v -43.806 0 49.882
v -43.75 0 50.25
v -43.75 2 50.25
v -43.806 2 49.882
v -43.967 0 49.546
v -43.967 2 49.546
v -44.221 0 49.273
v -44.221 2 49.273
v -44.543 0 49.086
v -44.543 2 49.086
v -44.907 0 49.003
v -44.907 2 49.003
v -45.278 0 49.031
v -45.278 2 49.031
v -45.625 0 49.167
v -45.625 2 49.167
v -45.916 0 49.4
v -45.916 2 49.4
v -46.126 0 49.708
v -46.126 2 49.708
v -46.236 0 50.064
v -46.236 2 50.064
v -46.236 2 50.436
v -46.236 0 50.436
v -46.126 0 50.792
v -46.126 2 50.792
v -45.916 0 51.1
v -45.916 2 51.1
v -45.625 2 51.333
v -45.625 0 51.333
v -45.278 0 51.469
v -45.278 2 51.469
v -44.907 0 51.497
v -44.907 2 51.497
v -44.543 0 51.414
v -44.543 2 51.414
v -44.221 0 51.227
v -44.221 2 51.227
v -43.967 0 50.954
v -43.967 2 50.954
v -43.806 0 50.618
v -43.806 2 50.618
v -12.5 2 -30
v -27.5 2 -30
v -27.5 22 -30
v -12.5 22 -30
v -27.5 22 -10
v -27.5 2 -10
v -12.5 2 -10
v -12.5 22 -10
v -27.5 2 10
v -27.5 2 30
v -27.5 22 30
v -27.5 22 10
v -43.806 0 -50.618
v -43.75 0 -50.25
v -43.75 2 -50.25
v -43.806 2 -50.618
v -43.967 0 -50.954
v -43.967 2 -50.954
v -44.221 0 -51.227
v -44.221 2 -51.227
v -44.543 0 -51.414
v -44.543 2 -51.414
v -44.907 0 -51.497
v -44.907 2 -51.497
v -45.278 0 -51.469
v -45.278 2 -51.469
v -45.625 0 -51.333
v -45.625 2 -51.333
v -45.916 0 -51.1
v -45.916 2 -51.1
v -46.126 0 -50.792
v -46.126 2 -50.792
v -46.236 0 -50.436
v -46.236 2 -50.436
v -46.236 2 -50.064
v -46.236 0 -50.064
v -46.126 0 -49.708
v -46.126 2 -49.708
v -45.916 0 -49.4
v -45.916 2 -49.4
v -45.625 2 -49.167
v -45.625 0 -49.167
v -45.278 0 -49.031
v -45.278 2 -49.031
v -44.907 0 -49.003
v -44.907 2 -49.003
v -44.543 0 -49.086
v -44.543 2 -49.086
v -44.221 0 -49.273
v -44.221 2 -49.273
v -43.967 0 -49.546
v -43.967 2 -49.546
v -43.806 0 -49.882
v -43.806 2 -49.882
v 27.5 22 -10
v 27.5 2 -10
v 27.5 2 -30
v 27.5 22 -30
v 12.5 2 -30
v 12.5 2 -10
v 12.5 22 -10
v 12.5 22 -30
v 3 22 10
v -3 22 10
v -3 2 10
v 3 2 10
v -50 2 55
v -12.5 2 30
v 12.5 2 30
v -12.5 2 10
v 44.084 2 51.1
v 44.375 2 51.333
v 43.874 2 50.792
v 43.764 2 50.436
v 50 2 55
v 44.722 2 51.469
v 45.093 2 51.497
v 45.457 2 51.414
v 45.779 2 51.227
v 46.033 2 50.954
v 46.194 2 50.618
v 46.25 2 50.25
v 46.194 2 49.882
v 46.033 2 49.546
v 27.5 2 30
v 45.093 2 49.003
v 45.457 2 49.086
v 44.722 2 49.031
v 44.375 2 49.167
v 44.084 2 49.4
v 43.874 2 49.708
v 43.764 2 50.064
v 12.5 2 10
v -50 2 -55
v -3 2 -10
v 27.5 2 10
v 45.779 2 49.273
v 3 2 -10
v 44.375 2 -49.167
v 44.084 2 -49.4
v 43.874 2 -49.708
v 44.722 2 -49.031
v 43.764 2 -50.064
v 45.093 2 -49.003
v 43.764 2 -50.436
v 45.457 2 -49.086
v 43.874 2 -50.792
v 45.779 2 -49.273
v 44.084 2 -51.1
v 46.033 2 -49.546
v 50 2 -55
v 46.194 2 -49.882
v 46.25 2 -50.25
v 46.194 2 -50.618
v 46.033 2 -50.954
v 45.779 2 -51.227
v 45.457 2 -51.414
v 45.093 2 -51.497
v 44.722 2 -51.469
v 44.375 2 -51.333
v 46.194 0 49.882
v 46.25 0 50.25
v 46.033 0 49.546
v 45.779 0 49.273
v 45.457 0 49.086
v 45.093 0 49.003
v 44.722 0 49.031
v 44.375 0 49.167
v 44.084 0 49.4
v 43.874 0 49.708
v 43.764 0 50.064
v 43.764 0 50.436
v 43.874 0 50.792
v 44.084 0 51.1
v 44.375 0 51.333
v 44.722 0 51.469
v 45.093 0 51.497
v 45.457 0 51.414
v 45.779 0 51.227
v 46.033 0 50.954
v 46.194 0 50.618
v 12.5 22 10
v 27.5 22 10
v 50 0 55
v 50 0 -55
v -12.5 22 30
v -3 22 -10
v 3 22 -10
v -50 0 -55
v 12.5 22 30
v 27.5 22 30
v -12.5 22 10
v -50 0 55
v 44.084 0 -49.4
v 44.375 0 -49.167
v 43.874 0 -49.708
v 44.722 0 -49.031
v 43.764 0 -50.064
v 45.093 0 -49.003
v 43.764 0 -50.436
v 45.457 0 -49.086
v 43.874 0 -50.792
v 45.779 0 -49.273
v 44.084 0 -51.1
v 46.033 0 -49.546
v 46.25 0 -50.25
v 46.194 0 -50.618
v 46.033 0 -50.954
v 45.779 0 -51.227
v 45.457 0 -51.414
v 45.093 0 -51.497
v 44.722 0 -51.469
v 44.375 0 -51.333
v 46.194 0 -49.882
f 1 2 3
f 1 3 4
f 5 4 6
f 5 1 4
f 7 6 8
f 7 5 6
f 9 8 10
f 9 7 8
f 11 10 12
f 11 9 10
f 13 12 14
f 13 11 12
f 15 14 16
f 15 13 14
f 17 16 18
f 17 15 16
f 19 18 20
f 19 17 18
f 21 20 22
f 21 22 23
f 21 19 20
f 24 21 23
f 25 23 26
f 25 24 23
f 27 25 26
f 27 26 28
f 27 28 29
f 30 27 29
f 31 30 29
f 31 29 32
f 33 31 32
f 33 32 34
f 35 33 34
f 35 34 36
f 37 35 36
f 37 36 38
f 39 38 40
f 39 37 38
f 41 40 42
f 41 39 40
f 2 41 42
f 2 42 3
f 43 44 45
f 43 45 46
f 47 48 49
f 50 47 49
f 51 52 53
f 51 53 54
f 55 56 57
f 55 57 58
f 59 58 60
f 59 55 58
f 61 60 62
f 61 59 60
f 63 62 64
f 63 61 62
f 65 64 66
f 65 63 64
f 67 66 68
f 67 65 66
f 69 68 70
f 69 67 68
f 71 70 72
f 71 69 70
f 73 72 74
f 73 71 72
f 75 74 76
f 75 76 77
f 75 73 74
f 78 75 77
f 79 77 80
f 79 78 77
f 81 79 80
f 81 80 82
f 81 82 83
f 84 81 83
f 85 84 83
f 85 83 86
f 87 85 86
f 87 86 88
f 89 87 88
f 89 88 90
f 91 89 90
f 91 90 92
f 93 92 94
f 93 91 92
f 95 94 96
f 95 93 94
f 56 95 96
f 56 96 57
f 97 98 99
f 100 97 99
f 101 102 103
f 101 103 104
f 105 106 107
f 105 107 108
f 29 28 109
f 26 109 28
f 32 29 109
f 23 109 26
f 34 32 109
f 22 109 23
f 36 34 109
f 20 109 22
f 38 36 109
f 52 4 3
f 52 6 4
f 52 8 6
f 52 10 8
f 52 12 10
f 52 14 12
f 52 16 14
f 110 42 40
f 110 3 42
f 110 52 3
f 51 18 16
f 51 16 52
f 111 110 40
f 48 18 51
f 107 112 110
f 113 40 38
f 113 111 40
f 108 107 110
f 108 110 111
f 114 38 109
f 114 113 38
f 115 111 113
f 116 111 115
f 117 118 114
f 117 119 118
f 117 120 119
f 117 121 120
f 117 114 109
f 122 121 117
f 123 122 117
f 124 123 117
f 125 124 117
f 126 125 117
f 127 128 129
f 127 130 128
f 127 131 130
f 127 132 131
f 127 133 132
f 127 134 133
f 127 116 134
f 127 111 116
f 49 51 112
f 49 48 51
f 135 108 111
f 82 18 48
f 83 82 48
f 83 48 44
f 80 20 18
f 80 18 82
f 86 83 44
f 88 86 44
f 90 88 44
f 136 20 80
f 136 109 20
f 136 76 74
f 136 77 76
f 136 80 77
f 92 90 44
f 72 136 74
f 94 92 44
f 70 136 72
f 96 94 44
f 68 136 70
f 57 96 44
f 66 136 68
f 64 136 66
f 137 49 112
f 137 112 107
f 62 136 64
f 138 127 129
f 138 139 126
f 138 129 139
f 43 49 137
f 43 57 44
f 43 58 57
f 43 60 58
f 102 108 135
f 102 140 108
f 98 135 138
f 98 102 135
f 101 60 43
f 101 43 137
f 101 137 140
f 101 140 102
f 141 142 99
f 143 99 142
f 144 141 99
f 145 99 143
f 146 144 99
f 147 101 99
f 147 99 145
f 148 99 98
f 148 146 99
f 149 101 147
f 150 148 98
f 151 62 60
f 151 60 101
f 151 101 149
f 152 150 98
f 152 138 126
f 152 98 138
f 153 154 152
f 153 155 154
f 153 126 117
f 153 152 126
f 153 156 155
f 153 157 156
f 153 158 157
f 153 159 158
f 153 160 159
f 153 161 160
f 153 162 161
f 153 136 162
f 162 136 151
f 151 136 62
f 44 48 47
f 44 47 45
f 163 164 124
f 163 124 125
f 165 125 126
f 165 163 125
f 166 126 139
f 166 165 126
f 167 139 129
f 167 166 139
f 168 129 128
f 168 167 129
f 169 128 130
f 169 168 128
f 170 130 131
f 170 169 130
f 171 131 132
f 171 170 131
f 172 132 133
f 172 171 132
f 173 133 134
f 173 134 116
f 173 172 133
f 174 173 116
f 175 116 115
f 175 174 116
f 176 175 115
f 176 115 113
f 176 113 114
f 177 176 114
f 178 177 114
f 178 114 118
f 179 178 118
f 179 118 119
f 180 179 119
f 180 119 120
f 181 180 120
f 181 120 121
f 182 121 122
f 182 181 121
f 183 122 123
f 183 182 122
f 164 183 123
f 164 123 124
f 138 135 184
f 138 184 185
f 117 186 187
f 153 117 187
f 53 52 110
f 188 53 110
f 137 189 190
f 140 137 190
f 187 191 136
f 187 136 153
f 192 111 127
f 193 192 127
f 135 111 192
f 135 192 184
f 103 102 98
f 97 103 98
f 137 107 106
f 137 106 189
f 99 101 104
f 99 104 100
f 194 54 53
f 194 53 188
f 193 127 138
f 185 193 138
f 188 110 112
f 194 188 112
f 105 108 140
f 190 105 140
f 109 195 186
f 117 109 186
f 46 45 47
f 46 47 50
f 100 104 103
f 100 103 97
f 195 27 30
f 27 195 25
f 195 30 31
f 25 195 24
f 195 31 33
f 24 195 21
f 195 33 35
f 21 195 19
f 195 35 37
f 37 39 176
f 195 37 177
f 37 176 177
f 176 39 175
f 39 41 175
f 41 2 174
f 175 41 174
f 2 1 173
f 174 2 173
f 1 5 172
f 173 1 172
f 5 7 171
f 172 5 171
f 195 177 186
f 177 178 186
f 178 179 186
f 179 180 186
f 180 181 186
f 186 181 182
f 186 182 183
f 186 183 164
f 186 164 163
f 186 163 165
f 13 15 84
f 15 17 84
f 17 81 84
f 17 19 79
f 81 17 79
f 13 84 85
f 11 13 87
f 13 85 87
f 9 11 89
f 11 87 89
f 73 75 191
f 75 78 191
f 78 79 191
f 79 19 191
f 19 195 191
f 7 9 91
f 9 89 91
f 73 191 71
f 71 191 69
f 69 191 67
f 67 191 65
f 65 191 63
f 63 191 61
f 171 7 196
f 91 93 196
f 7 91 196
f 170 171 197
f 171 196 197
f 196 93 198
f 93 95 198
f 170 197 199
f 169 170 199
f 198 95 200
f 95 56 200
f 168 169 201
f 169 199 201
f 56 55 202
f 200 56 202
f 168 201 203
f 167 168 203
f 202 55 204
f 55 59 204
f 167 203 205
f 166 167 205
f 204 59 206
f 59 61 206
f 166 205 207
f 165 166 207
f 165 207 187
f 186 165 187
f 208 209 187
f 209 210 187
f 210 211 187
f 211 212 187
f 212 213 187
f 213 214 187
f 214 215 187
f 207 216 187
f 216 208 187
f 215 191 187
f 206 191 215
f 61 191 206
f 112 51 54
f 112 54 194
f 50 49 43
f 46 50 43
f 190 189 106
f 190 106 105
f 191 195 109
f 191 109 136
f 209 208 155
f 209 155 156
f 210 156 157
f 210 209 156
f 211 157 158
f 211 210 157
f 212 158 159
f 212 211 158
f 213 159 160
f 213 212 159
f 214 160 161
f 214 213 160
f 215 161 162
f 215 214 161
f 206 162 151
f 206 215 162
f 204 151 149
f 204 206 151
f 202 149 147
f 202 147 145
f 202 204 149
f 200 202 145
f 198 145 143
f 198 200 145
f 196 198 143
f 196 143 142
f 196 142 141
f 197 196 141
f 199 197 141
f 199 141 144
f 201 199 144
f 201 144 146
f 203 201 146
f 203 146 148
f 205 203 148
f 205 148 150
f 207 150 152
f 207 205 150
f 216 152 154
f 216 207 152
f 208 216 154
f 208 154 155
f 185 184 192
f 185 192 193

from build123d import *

# Parameters (mm, degrees)
SKETCH2_W           = 100
SKETCH2_H           = 110
SKETCH2_R           = 1.25
BOSS_EXTRUDE1_DEPTH = 2
SKETCH3_W           = 15
SKETCH3_H           = 20
SKETCH3_W_2         = 6
BOSS_EXTRUDE2_DEPTH = 20


with BuildPart() as part:
    # Sketch2 → Boss-Extrude1 (new body)
    with BuildSketch(Plane(origin=(0, 0, 0), x_dir=(1, 0, 0), z_dir=(0, 1, 0))):
        Rectangle(SKETCH2_W, SKETCH2_H)
        with Locations((-45, 50.25)):
            Circle(SKETCH2_R, mode=Mode.SUBTRACT)
        with Locations((45, 50.25)):
            Circle(SKETCH2_R, mode=Mode.SUBTRACT)
        with Locations((45, -50.25)):
            Circle(SKETCH2_R, mode=Mode.SUBTRACT)
        with Locations((-45, -50.25)):
            Circle(SKETCH2_R, mode=Mode.SUBTRACT)
    extrude(amount=BOSS_EXTRUDE1_DEPTH)

    # Sketch3 → Boss-Extrude2 (add)
    with BuildSketch(Plane(origin=(0, 2, 0), x_dir=(1, 0, 0), z_dir=(0, 1, 0))):
        with Locations((-20, -20)):
            Rectangle(SKETCH3_W, SKETCH3_H)
        Rectangle(SKETCH3_W_2, SKETCH3_H)
        with Locations((-20, 20)):
            Rectangle(SKETCH3_W, SKETCH3_H)
        with Locations((20, 20)):
            Rectangle(SKETCH3_W, SKETCH3_H)
        with Locations((20, -20)):
            Rectangle(SKETCH3_W, SKETCH3_H)
    extrude(amount=BOSS_EXTRUDE2_DEPTH)


solid = part.part
